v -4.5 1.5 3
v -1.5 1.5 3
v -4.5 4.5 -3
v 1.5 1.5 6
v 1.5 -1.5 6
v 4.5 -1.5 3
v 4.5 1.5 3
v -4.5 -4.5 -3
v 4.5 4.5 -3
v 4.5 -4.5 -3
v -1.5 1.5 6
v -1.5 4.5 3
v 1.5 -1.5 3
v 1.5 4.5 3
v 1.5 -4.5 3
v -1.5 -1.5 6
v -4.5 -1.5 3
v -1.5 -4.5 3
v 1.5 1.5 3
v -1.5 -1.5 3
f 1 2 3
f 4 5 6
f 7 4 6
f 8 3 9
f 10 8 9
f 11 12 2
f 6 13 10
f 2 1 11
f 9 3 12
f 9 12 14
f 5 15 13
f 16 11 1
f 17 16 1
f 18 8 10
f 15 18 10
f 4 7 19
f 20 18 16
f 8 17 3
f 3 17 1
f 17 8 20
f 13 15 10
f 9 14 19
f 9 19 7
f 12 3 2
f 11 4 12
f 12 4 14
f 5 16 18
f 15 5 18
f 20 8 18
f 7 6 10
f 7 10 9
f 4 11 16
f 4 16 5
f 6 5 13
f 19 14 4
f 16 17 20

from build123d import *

# Parameters (mm, degrees)
SKETCH_1_W               = 9
SKETCH_1_H               = 9
EXTRUDE_2_DEPTH          = 3
SKETCH_4_W               = 3
SKETCH_4_H               = 3
EXTRUDE_3_DEPTH          = 3
MIRROR_2_DEPTH           = 2.683281573
MIRROR_2_DRAFT           = 11.536959
MIRROR_2_2_DEPTH         = 2.683281573
MIRROR_2_2_DRAFT         = 11.536959
EXTRUDE_4_DEPTH          = 3
PATTERN_CIRCULAR_1_COUNT = 4


# Read off the part's stored shape, not the designer's step: 镜向2
with BuildPart() as part:
    # 草图1 → 凸台-拉伸2 (new, symmetric)
    with BuildSketch(Plane.XY):
        Rectangle(SKETCH_1_W, SKETCH_1_H)
    extrude(amount=EXTRUDE_2_DEPTH, both=True)

    # 草图4 → 凸台-拉伸3 (add)
    with BuildSketch(Plane.XY.offset(3)):
        Rectangle(SKETCH_4_W, SKETCH_4_H)
    extrude(amount=EXTRUDE_3_DEPTH)

    # 草图5 → 切除-放样1 section 0
    with BuildSketch(Plane.XY.offset(3), mode=Mode.PRIVATE) as loft_1_s0:
        with BuildLine():
            Line((1.5, -1.5), (4.5, -1.5))
            Line((4.5, -1.5), (4.5, -4.5))
            Line((4.5, -4.5), (1.5, -4.5))
            Line((1.5, -4.5), (1.5, -1.5))
        make_face()
    loft_1 = loft([Vertex(4.5, -4.5, -3), loft_1_s0.sketch], mode=Mode.SUBTRACT)

    # 镜向1: 切除-放样1 across plane
    add(loft_1.mirror(Plane.ZX), mode=Mode.SUBTRACT)


with BuildPart() as mirror_2_tool:
    # 镜向2 outline → 镜向2 (with draft: the straight prism first)
    with BuildSketch(Plane(origin=(-2.4, 0, 1.2), x_dir=(0.4472135954999576, 0, 0.8944271909999161), z_dir=(0.894427190999916, 0, -0.447213595499958))):
        Polygon((-4.695742753, 4.5), (2.01246118, 1.5), (2.01246118, 4.5), align=None)
    extrude(amount=-MIRROR_2_DEPTH)
    # 镜向2: the draft: its side faces are tilted about the plane it starts from
    mirror_2_sides = [mirror_2_tool.faces().sort_by_distance(p)[0] for p in [
        (-4.2, -3, 0.6),
        (-2.7, -3, 3.6),
        (-4.2, -4.5, 0.6),
    ]]
    draft(mirror_2_sides, Plane(origin=(-2.4, 0, 1.2), x_dir=(0.4472135954999576, 0, 0.8944271909999161), z_dir=(0.894427190999916, 0, -0.447213595499958)), MIRROR_2_DRAFT)


with BuildPart() as part_1:
    add(part.part)

    # 镜向2: cut by mirror_2_tool
    add(mirror_2_tool.part, mode=Mode.SUBTRACT)


with BuildPart() as mirror_2_2_tool:
    # Mirror 2 2 outline → Mirror 2 2 (with draft: the straight prism first)
    with BuildSketch(Plane(origin=(-2.4, 0, 1.2), x_dir=(0.4472135954999576, 0, 0.8944271909999161), z_dir=(0.894427190999916, 0, -0.447213595499958))):
        Polygon((2.01246118, -4.5), (2.01246118, -1.5), (-4.695742753, -4.5), align=None)
    extrude(amount=-MIRROR_2_2_DEPTH)
    # Mirror 2 2: the draft: its side faces are tilted about the plane it starts from
    mirror_2_2_sides = [mirror_2_2_tool.faces().sort_by_distance(p)[0] for p in [
        (-2.7, 3, 3.6),
        (-4.2, 3, 0.6),
        (-4.2, 4.5, 0.6),
    ]]
    draft(mirror_2_2_sides, Plane(origin=(-2.4, 0, 1.2), x_dir=(0.4472135954999576, 0, 0.8944271909999161), z_dir=(0.894427190999916, 0, -0.447213595499958)), MIRROR_2_2_DRAFT)


with BuildPart() as part_2:
    add(part_1.part)

    # Mirror 2 2: cut by mirror_2_2_tool
    add(mirror_2_2_tool.part, mode=Mode.SUBTRACT)

    # 草图7 → 凸台-拉伸4 (add)
    with BuildSketch(Plane.XZ.offset(1.5)):
        Polygon((1.5, 6), (4.5, 3), (1.5, 3), align=None)
    extrude_4 = extrude(amount=-EXTRUDE_4_DEPTH)

    # 阵列(圆周)1: 凸台-拉伸4 ×4 about axis
    pattern_circular_1_axis = Axis((0, 0, 0), (0, 0, 1))
    for i in range(1, PATTERN_CIRCULAR_1_COUNT):
        add(extrude_4.rotate(pattern_circular_1_axis, i * 360 / PATTERN_CIRCULAR_1_COUNT))


solid = part_2.part
